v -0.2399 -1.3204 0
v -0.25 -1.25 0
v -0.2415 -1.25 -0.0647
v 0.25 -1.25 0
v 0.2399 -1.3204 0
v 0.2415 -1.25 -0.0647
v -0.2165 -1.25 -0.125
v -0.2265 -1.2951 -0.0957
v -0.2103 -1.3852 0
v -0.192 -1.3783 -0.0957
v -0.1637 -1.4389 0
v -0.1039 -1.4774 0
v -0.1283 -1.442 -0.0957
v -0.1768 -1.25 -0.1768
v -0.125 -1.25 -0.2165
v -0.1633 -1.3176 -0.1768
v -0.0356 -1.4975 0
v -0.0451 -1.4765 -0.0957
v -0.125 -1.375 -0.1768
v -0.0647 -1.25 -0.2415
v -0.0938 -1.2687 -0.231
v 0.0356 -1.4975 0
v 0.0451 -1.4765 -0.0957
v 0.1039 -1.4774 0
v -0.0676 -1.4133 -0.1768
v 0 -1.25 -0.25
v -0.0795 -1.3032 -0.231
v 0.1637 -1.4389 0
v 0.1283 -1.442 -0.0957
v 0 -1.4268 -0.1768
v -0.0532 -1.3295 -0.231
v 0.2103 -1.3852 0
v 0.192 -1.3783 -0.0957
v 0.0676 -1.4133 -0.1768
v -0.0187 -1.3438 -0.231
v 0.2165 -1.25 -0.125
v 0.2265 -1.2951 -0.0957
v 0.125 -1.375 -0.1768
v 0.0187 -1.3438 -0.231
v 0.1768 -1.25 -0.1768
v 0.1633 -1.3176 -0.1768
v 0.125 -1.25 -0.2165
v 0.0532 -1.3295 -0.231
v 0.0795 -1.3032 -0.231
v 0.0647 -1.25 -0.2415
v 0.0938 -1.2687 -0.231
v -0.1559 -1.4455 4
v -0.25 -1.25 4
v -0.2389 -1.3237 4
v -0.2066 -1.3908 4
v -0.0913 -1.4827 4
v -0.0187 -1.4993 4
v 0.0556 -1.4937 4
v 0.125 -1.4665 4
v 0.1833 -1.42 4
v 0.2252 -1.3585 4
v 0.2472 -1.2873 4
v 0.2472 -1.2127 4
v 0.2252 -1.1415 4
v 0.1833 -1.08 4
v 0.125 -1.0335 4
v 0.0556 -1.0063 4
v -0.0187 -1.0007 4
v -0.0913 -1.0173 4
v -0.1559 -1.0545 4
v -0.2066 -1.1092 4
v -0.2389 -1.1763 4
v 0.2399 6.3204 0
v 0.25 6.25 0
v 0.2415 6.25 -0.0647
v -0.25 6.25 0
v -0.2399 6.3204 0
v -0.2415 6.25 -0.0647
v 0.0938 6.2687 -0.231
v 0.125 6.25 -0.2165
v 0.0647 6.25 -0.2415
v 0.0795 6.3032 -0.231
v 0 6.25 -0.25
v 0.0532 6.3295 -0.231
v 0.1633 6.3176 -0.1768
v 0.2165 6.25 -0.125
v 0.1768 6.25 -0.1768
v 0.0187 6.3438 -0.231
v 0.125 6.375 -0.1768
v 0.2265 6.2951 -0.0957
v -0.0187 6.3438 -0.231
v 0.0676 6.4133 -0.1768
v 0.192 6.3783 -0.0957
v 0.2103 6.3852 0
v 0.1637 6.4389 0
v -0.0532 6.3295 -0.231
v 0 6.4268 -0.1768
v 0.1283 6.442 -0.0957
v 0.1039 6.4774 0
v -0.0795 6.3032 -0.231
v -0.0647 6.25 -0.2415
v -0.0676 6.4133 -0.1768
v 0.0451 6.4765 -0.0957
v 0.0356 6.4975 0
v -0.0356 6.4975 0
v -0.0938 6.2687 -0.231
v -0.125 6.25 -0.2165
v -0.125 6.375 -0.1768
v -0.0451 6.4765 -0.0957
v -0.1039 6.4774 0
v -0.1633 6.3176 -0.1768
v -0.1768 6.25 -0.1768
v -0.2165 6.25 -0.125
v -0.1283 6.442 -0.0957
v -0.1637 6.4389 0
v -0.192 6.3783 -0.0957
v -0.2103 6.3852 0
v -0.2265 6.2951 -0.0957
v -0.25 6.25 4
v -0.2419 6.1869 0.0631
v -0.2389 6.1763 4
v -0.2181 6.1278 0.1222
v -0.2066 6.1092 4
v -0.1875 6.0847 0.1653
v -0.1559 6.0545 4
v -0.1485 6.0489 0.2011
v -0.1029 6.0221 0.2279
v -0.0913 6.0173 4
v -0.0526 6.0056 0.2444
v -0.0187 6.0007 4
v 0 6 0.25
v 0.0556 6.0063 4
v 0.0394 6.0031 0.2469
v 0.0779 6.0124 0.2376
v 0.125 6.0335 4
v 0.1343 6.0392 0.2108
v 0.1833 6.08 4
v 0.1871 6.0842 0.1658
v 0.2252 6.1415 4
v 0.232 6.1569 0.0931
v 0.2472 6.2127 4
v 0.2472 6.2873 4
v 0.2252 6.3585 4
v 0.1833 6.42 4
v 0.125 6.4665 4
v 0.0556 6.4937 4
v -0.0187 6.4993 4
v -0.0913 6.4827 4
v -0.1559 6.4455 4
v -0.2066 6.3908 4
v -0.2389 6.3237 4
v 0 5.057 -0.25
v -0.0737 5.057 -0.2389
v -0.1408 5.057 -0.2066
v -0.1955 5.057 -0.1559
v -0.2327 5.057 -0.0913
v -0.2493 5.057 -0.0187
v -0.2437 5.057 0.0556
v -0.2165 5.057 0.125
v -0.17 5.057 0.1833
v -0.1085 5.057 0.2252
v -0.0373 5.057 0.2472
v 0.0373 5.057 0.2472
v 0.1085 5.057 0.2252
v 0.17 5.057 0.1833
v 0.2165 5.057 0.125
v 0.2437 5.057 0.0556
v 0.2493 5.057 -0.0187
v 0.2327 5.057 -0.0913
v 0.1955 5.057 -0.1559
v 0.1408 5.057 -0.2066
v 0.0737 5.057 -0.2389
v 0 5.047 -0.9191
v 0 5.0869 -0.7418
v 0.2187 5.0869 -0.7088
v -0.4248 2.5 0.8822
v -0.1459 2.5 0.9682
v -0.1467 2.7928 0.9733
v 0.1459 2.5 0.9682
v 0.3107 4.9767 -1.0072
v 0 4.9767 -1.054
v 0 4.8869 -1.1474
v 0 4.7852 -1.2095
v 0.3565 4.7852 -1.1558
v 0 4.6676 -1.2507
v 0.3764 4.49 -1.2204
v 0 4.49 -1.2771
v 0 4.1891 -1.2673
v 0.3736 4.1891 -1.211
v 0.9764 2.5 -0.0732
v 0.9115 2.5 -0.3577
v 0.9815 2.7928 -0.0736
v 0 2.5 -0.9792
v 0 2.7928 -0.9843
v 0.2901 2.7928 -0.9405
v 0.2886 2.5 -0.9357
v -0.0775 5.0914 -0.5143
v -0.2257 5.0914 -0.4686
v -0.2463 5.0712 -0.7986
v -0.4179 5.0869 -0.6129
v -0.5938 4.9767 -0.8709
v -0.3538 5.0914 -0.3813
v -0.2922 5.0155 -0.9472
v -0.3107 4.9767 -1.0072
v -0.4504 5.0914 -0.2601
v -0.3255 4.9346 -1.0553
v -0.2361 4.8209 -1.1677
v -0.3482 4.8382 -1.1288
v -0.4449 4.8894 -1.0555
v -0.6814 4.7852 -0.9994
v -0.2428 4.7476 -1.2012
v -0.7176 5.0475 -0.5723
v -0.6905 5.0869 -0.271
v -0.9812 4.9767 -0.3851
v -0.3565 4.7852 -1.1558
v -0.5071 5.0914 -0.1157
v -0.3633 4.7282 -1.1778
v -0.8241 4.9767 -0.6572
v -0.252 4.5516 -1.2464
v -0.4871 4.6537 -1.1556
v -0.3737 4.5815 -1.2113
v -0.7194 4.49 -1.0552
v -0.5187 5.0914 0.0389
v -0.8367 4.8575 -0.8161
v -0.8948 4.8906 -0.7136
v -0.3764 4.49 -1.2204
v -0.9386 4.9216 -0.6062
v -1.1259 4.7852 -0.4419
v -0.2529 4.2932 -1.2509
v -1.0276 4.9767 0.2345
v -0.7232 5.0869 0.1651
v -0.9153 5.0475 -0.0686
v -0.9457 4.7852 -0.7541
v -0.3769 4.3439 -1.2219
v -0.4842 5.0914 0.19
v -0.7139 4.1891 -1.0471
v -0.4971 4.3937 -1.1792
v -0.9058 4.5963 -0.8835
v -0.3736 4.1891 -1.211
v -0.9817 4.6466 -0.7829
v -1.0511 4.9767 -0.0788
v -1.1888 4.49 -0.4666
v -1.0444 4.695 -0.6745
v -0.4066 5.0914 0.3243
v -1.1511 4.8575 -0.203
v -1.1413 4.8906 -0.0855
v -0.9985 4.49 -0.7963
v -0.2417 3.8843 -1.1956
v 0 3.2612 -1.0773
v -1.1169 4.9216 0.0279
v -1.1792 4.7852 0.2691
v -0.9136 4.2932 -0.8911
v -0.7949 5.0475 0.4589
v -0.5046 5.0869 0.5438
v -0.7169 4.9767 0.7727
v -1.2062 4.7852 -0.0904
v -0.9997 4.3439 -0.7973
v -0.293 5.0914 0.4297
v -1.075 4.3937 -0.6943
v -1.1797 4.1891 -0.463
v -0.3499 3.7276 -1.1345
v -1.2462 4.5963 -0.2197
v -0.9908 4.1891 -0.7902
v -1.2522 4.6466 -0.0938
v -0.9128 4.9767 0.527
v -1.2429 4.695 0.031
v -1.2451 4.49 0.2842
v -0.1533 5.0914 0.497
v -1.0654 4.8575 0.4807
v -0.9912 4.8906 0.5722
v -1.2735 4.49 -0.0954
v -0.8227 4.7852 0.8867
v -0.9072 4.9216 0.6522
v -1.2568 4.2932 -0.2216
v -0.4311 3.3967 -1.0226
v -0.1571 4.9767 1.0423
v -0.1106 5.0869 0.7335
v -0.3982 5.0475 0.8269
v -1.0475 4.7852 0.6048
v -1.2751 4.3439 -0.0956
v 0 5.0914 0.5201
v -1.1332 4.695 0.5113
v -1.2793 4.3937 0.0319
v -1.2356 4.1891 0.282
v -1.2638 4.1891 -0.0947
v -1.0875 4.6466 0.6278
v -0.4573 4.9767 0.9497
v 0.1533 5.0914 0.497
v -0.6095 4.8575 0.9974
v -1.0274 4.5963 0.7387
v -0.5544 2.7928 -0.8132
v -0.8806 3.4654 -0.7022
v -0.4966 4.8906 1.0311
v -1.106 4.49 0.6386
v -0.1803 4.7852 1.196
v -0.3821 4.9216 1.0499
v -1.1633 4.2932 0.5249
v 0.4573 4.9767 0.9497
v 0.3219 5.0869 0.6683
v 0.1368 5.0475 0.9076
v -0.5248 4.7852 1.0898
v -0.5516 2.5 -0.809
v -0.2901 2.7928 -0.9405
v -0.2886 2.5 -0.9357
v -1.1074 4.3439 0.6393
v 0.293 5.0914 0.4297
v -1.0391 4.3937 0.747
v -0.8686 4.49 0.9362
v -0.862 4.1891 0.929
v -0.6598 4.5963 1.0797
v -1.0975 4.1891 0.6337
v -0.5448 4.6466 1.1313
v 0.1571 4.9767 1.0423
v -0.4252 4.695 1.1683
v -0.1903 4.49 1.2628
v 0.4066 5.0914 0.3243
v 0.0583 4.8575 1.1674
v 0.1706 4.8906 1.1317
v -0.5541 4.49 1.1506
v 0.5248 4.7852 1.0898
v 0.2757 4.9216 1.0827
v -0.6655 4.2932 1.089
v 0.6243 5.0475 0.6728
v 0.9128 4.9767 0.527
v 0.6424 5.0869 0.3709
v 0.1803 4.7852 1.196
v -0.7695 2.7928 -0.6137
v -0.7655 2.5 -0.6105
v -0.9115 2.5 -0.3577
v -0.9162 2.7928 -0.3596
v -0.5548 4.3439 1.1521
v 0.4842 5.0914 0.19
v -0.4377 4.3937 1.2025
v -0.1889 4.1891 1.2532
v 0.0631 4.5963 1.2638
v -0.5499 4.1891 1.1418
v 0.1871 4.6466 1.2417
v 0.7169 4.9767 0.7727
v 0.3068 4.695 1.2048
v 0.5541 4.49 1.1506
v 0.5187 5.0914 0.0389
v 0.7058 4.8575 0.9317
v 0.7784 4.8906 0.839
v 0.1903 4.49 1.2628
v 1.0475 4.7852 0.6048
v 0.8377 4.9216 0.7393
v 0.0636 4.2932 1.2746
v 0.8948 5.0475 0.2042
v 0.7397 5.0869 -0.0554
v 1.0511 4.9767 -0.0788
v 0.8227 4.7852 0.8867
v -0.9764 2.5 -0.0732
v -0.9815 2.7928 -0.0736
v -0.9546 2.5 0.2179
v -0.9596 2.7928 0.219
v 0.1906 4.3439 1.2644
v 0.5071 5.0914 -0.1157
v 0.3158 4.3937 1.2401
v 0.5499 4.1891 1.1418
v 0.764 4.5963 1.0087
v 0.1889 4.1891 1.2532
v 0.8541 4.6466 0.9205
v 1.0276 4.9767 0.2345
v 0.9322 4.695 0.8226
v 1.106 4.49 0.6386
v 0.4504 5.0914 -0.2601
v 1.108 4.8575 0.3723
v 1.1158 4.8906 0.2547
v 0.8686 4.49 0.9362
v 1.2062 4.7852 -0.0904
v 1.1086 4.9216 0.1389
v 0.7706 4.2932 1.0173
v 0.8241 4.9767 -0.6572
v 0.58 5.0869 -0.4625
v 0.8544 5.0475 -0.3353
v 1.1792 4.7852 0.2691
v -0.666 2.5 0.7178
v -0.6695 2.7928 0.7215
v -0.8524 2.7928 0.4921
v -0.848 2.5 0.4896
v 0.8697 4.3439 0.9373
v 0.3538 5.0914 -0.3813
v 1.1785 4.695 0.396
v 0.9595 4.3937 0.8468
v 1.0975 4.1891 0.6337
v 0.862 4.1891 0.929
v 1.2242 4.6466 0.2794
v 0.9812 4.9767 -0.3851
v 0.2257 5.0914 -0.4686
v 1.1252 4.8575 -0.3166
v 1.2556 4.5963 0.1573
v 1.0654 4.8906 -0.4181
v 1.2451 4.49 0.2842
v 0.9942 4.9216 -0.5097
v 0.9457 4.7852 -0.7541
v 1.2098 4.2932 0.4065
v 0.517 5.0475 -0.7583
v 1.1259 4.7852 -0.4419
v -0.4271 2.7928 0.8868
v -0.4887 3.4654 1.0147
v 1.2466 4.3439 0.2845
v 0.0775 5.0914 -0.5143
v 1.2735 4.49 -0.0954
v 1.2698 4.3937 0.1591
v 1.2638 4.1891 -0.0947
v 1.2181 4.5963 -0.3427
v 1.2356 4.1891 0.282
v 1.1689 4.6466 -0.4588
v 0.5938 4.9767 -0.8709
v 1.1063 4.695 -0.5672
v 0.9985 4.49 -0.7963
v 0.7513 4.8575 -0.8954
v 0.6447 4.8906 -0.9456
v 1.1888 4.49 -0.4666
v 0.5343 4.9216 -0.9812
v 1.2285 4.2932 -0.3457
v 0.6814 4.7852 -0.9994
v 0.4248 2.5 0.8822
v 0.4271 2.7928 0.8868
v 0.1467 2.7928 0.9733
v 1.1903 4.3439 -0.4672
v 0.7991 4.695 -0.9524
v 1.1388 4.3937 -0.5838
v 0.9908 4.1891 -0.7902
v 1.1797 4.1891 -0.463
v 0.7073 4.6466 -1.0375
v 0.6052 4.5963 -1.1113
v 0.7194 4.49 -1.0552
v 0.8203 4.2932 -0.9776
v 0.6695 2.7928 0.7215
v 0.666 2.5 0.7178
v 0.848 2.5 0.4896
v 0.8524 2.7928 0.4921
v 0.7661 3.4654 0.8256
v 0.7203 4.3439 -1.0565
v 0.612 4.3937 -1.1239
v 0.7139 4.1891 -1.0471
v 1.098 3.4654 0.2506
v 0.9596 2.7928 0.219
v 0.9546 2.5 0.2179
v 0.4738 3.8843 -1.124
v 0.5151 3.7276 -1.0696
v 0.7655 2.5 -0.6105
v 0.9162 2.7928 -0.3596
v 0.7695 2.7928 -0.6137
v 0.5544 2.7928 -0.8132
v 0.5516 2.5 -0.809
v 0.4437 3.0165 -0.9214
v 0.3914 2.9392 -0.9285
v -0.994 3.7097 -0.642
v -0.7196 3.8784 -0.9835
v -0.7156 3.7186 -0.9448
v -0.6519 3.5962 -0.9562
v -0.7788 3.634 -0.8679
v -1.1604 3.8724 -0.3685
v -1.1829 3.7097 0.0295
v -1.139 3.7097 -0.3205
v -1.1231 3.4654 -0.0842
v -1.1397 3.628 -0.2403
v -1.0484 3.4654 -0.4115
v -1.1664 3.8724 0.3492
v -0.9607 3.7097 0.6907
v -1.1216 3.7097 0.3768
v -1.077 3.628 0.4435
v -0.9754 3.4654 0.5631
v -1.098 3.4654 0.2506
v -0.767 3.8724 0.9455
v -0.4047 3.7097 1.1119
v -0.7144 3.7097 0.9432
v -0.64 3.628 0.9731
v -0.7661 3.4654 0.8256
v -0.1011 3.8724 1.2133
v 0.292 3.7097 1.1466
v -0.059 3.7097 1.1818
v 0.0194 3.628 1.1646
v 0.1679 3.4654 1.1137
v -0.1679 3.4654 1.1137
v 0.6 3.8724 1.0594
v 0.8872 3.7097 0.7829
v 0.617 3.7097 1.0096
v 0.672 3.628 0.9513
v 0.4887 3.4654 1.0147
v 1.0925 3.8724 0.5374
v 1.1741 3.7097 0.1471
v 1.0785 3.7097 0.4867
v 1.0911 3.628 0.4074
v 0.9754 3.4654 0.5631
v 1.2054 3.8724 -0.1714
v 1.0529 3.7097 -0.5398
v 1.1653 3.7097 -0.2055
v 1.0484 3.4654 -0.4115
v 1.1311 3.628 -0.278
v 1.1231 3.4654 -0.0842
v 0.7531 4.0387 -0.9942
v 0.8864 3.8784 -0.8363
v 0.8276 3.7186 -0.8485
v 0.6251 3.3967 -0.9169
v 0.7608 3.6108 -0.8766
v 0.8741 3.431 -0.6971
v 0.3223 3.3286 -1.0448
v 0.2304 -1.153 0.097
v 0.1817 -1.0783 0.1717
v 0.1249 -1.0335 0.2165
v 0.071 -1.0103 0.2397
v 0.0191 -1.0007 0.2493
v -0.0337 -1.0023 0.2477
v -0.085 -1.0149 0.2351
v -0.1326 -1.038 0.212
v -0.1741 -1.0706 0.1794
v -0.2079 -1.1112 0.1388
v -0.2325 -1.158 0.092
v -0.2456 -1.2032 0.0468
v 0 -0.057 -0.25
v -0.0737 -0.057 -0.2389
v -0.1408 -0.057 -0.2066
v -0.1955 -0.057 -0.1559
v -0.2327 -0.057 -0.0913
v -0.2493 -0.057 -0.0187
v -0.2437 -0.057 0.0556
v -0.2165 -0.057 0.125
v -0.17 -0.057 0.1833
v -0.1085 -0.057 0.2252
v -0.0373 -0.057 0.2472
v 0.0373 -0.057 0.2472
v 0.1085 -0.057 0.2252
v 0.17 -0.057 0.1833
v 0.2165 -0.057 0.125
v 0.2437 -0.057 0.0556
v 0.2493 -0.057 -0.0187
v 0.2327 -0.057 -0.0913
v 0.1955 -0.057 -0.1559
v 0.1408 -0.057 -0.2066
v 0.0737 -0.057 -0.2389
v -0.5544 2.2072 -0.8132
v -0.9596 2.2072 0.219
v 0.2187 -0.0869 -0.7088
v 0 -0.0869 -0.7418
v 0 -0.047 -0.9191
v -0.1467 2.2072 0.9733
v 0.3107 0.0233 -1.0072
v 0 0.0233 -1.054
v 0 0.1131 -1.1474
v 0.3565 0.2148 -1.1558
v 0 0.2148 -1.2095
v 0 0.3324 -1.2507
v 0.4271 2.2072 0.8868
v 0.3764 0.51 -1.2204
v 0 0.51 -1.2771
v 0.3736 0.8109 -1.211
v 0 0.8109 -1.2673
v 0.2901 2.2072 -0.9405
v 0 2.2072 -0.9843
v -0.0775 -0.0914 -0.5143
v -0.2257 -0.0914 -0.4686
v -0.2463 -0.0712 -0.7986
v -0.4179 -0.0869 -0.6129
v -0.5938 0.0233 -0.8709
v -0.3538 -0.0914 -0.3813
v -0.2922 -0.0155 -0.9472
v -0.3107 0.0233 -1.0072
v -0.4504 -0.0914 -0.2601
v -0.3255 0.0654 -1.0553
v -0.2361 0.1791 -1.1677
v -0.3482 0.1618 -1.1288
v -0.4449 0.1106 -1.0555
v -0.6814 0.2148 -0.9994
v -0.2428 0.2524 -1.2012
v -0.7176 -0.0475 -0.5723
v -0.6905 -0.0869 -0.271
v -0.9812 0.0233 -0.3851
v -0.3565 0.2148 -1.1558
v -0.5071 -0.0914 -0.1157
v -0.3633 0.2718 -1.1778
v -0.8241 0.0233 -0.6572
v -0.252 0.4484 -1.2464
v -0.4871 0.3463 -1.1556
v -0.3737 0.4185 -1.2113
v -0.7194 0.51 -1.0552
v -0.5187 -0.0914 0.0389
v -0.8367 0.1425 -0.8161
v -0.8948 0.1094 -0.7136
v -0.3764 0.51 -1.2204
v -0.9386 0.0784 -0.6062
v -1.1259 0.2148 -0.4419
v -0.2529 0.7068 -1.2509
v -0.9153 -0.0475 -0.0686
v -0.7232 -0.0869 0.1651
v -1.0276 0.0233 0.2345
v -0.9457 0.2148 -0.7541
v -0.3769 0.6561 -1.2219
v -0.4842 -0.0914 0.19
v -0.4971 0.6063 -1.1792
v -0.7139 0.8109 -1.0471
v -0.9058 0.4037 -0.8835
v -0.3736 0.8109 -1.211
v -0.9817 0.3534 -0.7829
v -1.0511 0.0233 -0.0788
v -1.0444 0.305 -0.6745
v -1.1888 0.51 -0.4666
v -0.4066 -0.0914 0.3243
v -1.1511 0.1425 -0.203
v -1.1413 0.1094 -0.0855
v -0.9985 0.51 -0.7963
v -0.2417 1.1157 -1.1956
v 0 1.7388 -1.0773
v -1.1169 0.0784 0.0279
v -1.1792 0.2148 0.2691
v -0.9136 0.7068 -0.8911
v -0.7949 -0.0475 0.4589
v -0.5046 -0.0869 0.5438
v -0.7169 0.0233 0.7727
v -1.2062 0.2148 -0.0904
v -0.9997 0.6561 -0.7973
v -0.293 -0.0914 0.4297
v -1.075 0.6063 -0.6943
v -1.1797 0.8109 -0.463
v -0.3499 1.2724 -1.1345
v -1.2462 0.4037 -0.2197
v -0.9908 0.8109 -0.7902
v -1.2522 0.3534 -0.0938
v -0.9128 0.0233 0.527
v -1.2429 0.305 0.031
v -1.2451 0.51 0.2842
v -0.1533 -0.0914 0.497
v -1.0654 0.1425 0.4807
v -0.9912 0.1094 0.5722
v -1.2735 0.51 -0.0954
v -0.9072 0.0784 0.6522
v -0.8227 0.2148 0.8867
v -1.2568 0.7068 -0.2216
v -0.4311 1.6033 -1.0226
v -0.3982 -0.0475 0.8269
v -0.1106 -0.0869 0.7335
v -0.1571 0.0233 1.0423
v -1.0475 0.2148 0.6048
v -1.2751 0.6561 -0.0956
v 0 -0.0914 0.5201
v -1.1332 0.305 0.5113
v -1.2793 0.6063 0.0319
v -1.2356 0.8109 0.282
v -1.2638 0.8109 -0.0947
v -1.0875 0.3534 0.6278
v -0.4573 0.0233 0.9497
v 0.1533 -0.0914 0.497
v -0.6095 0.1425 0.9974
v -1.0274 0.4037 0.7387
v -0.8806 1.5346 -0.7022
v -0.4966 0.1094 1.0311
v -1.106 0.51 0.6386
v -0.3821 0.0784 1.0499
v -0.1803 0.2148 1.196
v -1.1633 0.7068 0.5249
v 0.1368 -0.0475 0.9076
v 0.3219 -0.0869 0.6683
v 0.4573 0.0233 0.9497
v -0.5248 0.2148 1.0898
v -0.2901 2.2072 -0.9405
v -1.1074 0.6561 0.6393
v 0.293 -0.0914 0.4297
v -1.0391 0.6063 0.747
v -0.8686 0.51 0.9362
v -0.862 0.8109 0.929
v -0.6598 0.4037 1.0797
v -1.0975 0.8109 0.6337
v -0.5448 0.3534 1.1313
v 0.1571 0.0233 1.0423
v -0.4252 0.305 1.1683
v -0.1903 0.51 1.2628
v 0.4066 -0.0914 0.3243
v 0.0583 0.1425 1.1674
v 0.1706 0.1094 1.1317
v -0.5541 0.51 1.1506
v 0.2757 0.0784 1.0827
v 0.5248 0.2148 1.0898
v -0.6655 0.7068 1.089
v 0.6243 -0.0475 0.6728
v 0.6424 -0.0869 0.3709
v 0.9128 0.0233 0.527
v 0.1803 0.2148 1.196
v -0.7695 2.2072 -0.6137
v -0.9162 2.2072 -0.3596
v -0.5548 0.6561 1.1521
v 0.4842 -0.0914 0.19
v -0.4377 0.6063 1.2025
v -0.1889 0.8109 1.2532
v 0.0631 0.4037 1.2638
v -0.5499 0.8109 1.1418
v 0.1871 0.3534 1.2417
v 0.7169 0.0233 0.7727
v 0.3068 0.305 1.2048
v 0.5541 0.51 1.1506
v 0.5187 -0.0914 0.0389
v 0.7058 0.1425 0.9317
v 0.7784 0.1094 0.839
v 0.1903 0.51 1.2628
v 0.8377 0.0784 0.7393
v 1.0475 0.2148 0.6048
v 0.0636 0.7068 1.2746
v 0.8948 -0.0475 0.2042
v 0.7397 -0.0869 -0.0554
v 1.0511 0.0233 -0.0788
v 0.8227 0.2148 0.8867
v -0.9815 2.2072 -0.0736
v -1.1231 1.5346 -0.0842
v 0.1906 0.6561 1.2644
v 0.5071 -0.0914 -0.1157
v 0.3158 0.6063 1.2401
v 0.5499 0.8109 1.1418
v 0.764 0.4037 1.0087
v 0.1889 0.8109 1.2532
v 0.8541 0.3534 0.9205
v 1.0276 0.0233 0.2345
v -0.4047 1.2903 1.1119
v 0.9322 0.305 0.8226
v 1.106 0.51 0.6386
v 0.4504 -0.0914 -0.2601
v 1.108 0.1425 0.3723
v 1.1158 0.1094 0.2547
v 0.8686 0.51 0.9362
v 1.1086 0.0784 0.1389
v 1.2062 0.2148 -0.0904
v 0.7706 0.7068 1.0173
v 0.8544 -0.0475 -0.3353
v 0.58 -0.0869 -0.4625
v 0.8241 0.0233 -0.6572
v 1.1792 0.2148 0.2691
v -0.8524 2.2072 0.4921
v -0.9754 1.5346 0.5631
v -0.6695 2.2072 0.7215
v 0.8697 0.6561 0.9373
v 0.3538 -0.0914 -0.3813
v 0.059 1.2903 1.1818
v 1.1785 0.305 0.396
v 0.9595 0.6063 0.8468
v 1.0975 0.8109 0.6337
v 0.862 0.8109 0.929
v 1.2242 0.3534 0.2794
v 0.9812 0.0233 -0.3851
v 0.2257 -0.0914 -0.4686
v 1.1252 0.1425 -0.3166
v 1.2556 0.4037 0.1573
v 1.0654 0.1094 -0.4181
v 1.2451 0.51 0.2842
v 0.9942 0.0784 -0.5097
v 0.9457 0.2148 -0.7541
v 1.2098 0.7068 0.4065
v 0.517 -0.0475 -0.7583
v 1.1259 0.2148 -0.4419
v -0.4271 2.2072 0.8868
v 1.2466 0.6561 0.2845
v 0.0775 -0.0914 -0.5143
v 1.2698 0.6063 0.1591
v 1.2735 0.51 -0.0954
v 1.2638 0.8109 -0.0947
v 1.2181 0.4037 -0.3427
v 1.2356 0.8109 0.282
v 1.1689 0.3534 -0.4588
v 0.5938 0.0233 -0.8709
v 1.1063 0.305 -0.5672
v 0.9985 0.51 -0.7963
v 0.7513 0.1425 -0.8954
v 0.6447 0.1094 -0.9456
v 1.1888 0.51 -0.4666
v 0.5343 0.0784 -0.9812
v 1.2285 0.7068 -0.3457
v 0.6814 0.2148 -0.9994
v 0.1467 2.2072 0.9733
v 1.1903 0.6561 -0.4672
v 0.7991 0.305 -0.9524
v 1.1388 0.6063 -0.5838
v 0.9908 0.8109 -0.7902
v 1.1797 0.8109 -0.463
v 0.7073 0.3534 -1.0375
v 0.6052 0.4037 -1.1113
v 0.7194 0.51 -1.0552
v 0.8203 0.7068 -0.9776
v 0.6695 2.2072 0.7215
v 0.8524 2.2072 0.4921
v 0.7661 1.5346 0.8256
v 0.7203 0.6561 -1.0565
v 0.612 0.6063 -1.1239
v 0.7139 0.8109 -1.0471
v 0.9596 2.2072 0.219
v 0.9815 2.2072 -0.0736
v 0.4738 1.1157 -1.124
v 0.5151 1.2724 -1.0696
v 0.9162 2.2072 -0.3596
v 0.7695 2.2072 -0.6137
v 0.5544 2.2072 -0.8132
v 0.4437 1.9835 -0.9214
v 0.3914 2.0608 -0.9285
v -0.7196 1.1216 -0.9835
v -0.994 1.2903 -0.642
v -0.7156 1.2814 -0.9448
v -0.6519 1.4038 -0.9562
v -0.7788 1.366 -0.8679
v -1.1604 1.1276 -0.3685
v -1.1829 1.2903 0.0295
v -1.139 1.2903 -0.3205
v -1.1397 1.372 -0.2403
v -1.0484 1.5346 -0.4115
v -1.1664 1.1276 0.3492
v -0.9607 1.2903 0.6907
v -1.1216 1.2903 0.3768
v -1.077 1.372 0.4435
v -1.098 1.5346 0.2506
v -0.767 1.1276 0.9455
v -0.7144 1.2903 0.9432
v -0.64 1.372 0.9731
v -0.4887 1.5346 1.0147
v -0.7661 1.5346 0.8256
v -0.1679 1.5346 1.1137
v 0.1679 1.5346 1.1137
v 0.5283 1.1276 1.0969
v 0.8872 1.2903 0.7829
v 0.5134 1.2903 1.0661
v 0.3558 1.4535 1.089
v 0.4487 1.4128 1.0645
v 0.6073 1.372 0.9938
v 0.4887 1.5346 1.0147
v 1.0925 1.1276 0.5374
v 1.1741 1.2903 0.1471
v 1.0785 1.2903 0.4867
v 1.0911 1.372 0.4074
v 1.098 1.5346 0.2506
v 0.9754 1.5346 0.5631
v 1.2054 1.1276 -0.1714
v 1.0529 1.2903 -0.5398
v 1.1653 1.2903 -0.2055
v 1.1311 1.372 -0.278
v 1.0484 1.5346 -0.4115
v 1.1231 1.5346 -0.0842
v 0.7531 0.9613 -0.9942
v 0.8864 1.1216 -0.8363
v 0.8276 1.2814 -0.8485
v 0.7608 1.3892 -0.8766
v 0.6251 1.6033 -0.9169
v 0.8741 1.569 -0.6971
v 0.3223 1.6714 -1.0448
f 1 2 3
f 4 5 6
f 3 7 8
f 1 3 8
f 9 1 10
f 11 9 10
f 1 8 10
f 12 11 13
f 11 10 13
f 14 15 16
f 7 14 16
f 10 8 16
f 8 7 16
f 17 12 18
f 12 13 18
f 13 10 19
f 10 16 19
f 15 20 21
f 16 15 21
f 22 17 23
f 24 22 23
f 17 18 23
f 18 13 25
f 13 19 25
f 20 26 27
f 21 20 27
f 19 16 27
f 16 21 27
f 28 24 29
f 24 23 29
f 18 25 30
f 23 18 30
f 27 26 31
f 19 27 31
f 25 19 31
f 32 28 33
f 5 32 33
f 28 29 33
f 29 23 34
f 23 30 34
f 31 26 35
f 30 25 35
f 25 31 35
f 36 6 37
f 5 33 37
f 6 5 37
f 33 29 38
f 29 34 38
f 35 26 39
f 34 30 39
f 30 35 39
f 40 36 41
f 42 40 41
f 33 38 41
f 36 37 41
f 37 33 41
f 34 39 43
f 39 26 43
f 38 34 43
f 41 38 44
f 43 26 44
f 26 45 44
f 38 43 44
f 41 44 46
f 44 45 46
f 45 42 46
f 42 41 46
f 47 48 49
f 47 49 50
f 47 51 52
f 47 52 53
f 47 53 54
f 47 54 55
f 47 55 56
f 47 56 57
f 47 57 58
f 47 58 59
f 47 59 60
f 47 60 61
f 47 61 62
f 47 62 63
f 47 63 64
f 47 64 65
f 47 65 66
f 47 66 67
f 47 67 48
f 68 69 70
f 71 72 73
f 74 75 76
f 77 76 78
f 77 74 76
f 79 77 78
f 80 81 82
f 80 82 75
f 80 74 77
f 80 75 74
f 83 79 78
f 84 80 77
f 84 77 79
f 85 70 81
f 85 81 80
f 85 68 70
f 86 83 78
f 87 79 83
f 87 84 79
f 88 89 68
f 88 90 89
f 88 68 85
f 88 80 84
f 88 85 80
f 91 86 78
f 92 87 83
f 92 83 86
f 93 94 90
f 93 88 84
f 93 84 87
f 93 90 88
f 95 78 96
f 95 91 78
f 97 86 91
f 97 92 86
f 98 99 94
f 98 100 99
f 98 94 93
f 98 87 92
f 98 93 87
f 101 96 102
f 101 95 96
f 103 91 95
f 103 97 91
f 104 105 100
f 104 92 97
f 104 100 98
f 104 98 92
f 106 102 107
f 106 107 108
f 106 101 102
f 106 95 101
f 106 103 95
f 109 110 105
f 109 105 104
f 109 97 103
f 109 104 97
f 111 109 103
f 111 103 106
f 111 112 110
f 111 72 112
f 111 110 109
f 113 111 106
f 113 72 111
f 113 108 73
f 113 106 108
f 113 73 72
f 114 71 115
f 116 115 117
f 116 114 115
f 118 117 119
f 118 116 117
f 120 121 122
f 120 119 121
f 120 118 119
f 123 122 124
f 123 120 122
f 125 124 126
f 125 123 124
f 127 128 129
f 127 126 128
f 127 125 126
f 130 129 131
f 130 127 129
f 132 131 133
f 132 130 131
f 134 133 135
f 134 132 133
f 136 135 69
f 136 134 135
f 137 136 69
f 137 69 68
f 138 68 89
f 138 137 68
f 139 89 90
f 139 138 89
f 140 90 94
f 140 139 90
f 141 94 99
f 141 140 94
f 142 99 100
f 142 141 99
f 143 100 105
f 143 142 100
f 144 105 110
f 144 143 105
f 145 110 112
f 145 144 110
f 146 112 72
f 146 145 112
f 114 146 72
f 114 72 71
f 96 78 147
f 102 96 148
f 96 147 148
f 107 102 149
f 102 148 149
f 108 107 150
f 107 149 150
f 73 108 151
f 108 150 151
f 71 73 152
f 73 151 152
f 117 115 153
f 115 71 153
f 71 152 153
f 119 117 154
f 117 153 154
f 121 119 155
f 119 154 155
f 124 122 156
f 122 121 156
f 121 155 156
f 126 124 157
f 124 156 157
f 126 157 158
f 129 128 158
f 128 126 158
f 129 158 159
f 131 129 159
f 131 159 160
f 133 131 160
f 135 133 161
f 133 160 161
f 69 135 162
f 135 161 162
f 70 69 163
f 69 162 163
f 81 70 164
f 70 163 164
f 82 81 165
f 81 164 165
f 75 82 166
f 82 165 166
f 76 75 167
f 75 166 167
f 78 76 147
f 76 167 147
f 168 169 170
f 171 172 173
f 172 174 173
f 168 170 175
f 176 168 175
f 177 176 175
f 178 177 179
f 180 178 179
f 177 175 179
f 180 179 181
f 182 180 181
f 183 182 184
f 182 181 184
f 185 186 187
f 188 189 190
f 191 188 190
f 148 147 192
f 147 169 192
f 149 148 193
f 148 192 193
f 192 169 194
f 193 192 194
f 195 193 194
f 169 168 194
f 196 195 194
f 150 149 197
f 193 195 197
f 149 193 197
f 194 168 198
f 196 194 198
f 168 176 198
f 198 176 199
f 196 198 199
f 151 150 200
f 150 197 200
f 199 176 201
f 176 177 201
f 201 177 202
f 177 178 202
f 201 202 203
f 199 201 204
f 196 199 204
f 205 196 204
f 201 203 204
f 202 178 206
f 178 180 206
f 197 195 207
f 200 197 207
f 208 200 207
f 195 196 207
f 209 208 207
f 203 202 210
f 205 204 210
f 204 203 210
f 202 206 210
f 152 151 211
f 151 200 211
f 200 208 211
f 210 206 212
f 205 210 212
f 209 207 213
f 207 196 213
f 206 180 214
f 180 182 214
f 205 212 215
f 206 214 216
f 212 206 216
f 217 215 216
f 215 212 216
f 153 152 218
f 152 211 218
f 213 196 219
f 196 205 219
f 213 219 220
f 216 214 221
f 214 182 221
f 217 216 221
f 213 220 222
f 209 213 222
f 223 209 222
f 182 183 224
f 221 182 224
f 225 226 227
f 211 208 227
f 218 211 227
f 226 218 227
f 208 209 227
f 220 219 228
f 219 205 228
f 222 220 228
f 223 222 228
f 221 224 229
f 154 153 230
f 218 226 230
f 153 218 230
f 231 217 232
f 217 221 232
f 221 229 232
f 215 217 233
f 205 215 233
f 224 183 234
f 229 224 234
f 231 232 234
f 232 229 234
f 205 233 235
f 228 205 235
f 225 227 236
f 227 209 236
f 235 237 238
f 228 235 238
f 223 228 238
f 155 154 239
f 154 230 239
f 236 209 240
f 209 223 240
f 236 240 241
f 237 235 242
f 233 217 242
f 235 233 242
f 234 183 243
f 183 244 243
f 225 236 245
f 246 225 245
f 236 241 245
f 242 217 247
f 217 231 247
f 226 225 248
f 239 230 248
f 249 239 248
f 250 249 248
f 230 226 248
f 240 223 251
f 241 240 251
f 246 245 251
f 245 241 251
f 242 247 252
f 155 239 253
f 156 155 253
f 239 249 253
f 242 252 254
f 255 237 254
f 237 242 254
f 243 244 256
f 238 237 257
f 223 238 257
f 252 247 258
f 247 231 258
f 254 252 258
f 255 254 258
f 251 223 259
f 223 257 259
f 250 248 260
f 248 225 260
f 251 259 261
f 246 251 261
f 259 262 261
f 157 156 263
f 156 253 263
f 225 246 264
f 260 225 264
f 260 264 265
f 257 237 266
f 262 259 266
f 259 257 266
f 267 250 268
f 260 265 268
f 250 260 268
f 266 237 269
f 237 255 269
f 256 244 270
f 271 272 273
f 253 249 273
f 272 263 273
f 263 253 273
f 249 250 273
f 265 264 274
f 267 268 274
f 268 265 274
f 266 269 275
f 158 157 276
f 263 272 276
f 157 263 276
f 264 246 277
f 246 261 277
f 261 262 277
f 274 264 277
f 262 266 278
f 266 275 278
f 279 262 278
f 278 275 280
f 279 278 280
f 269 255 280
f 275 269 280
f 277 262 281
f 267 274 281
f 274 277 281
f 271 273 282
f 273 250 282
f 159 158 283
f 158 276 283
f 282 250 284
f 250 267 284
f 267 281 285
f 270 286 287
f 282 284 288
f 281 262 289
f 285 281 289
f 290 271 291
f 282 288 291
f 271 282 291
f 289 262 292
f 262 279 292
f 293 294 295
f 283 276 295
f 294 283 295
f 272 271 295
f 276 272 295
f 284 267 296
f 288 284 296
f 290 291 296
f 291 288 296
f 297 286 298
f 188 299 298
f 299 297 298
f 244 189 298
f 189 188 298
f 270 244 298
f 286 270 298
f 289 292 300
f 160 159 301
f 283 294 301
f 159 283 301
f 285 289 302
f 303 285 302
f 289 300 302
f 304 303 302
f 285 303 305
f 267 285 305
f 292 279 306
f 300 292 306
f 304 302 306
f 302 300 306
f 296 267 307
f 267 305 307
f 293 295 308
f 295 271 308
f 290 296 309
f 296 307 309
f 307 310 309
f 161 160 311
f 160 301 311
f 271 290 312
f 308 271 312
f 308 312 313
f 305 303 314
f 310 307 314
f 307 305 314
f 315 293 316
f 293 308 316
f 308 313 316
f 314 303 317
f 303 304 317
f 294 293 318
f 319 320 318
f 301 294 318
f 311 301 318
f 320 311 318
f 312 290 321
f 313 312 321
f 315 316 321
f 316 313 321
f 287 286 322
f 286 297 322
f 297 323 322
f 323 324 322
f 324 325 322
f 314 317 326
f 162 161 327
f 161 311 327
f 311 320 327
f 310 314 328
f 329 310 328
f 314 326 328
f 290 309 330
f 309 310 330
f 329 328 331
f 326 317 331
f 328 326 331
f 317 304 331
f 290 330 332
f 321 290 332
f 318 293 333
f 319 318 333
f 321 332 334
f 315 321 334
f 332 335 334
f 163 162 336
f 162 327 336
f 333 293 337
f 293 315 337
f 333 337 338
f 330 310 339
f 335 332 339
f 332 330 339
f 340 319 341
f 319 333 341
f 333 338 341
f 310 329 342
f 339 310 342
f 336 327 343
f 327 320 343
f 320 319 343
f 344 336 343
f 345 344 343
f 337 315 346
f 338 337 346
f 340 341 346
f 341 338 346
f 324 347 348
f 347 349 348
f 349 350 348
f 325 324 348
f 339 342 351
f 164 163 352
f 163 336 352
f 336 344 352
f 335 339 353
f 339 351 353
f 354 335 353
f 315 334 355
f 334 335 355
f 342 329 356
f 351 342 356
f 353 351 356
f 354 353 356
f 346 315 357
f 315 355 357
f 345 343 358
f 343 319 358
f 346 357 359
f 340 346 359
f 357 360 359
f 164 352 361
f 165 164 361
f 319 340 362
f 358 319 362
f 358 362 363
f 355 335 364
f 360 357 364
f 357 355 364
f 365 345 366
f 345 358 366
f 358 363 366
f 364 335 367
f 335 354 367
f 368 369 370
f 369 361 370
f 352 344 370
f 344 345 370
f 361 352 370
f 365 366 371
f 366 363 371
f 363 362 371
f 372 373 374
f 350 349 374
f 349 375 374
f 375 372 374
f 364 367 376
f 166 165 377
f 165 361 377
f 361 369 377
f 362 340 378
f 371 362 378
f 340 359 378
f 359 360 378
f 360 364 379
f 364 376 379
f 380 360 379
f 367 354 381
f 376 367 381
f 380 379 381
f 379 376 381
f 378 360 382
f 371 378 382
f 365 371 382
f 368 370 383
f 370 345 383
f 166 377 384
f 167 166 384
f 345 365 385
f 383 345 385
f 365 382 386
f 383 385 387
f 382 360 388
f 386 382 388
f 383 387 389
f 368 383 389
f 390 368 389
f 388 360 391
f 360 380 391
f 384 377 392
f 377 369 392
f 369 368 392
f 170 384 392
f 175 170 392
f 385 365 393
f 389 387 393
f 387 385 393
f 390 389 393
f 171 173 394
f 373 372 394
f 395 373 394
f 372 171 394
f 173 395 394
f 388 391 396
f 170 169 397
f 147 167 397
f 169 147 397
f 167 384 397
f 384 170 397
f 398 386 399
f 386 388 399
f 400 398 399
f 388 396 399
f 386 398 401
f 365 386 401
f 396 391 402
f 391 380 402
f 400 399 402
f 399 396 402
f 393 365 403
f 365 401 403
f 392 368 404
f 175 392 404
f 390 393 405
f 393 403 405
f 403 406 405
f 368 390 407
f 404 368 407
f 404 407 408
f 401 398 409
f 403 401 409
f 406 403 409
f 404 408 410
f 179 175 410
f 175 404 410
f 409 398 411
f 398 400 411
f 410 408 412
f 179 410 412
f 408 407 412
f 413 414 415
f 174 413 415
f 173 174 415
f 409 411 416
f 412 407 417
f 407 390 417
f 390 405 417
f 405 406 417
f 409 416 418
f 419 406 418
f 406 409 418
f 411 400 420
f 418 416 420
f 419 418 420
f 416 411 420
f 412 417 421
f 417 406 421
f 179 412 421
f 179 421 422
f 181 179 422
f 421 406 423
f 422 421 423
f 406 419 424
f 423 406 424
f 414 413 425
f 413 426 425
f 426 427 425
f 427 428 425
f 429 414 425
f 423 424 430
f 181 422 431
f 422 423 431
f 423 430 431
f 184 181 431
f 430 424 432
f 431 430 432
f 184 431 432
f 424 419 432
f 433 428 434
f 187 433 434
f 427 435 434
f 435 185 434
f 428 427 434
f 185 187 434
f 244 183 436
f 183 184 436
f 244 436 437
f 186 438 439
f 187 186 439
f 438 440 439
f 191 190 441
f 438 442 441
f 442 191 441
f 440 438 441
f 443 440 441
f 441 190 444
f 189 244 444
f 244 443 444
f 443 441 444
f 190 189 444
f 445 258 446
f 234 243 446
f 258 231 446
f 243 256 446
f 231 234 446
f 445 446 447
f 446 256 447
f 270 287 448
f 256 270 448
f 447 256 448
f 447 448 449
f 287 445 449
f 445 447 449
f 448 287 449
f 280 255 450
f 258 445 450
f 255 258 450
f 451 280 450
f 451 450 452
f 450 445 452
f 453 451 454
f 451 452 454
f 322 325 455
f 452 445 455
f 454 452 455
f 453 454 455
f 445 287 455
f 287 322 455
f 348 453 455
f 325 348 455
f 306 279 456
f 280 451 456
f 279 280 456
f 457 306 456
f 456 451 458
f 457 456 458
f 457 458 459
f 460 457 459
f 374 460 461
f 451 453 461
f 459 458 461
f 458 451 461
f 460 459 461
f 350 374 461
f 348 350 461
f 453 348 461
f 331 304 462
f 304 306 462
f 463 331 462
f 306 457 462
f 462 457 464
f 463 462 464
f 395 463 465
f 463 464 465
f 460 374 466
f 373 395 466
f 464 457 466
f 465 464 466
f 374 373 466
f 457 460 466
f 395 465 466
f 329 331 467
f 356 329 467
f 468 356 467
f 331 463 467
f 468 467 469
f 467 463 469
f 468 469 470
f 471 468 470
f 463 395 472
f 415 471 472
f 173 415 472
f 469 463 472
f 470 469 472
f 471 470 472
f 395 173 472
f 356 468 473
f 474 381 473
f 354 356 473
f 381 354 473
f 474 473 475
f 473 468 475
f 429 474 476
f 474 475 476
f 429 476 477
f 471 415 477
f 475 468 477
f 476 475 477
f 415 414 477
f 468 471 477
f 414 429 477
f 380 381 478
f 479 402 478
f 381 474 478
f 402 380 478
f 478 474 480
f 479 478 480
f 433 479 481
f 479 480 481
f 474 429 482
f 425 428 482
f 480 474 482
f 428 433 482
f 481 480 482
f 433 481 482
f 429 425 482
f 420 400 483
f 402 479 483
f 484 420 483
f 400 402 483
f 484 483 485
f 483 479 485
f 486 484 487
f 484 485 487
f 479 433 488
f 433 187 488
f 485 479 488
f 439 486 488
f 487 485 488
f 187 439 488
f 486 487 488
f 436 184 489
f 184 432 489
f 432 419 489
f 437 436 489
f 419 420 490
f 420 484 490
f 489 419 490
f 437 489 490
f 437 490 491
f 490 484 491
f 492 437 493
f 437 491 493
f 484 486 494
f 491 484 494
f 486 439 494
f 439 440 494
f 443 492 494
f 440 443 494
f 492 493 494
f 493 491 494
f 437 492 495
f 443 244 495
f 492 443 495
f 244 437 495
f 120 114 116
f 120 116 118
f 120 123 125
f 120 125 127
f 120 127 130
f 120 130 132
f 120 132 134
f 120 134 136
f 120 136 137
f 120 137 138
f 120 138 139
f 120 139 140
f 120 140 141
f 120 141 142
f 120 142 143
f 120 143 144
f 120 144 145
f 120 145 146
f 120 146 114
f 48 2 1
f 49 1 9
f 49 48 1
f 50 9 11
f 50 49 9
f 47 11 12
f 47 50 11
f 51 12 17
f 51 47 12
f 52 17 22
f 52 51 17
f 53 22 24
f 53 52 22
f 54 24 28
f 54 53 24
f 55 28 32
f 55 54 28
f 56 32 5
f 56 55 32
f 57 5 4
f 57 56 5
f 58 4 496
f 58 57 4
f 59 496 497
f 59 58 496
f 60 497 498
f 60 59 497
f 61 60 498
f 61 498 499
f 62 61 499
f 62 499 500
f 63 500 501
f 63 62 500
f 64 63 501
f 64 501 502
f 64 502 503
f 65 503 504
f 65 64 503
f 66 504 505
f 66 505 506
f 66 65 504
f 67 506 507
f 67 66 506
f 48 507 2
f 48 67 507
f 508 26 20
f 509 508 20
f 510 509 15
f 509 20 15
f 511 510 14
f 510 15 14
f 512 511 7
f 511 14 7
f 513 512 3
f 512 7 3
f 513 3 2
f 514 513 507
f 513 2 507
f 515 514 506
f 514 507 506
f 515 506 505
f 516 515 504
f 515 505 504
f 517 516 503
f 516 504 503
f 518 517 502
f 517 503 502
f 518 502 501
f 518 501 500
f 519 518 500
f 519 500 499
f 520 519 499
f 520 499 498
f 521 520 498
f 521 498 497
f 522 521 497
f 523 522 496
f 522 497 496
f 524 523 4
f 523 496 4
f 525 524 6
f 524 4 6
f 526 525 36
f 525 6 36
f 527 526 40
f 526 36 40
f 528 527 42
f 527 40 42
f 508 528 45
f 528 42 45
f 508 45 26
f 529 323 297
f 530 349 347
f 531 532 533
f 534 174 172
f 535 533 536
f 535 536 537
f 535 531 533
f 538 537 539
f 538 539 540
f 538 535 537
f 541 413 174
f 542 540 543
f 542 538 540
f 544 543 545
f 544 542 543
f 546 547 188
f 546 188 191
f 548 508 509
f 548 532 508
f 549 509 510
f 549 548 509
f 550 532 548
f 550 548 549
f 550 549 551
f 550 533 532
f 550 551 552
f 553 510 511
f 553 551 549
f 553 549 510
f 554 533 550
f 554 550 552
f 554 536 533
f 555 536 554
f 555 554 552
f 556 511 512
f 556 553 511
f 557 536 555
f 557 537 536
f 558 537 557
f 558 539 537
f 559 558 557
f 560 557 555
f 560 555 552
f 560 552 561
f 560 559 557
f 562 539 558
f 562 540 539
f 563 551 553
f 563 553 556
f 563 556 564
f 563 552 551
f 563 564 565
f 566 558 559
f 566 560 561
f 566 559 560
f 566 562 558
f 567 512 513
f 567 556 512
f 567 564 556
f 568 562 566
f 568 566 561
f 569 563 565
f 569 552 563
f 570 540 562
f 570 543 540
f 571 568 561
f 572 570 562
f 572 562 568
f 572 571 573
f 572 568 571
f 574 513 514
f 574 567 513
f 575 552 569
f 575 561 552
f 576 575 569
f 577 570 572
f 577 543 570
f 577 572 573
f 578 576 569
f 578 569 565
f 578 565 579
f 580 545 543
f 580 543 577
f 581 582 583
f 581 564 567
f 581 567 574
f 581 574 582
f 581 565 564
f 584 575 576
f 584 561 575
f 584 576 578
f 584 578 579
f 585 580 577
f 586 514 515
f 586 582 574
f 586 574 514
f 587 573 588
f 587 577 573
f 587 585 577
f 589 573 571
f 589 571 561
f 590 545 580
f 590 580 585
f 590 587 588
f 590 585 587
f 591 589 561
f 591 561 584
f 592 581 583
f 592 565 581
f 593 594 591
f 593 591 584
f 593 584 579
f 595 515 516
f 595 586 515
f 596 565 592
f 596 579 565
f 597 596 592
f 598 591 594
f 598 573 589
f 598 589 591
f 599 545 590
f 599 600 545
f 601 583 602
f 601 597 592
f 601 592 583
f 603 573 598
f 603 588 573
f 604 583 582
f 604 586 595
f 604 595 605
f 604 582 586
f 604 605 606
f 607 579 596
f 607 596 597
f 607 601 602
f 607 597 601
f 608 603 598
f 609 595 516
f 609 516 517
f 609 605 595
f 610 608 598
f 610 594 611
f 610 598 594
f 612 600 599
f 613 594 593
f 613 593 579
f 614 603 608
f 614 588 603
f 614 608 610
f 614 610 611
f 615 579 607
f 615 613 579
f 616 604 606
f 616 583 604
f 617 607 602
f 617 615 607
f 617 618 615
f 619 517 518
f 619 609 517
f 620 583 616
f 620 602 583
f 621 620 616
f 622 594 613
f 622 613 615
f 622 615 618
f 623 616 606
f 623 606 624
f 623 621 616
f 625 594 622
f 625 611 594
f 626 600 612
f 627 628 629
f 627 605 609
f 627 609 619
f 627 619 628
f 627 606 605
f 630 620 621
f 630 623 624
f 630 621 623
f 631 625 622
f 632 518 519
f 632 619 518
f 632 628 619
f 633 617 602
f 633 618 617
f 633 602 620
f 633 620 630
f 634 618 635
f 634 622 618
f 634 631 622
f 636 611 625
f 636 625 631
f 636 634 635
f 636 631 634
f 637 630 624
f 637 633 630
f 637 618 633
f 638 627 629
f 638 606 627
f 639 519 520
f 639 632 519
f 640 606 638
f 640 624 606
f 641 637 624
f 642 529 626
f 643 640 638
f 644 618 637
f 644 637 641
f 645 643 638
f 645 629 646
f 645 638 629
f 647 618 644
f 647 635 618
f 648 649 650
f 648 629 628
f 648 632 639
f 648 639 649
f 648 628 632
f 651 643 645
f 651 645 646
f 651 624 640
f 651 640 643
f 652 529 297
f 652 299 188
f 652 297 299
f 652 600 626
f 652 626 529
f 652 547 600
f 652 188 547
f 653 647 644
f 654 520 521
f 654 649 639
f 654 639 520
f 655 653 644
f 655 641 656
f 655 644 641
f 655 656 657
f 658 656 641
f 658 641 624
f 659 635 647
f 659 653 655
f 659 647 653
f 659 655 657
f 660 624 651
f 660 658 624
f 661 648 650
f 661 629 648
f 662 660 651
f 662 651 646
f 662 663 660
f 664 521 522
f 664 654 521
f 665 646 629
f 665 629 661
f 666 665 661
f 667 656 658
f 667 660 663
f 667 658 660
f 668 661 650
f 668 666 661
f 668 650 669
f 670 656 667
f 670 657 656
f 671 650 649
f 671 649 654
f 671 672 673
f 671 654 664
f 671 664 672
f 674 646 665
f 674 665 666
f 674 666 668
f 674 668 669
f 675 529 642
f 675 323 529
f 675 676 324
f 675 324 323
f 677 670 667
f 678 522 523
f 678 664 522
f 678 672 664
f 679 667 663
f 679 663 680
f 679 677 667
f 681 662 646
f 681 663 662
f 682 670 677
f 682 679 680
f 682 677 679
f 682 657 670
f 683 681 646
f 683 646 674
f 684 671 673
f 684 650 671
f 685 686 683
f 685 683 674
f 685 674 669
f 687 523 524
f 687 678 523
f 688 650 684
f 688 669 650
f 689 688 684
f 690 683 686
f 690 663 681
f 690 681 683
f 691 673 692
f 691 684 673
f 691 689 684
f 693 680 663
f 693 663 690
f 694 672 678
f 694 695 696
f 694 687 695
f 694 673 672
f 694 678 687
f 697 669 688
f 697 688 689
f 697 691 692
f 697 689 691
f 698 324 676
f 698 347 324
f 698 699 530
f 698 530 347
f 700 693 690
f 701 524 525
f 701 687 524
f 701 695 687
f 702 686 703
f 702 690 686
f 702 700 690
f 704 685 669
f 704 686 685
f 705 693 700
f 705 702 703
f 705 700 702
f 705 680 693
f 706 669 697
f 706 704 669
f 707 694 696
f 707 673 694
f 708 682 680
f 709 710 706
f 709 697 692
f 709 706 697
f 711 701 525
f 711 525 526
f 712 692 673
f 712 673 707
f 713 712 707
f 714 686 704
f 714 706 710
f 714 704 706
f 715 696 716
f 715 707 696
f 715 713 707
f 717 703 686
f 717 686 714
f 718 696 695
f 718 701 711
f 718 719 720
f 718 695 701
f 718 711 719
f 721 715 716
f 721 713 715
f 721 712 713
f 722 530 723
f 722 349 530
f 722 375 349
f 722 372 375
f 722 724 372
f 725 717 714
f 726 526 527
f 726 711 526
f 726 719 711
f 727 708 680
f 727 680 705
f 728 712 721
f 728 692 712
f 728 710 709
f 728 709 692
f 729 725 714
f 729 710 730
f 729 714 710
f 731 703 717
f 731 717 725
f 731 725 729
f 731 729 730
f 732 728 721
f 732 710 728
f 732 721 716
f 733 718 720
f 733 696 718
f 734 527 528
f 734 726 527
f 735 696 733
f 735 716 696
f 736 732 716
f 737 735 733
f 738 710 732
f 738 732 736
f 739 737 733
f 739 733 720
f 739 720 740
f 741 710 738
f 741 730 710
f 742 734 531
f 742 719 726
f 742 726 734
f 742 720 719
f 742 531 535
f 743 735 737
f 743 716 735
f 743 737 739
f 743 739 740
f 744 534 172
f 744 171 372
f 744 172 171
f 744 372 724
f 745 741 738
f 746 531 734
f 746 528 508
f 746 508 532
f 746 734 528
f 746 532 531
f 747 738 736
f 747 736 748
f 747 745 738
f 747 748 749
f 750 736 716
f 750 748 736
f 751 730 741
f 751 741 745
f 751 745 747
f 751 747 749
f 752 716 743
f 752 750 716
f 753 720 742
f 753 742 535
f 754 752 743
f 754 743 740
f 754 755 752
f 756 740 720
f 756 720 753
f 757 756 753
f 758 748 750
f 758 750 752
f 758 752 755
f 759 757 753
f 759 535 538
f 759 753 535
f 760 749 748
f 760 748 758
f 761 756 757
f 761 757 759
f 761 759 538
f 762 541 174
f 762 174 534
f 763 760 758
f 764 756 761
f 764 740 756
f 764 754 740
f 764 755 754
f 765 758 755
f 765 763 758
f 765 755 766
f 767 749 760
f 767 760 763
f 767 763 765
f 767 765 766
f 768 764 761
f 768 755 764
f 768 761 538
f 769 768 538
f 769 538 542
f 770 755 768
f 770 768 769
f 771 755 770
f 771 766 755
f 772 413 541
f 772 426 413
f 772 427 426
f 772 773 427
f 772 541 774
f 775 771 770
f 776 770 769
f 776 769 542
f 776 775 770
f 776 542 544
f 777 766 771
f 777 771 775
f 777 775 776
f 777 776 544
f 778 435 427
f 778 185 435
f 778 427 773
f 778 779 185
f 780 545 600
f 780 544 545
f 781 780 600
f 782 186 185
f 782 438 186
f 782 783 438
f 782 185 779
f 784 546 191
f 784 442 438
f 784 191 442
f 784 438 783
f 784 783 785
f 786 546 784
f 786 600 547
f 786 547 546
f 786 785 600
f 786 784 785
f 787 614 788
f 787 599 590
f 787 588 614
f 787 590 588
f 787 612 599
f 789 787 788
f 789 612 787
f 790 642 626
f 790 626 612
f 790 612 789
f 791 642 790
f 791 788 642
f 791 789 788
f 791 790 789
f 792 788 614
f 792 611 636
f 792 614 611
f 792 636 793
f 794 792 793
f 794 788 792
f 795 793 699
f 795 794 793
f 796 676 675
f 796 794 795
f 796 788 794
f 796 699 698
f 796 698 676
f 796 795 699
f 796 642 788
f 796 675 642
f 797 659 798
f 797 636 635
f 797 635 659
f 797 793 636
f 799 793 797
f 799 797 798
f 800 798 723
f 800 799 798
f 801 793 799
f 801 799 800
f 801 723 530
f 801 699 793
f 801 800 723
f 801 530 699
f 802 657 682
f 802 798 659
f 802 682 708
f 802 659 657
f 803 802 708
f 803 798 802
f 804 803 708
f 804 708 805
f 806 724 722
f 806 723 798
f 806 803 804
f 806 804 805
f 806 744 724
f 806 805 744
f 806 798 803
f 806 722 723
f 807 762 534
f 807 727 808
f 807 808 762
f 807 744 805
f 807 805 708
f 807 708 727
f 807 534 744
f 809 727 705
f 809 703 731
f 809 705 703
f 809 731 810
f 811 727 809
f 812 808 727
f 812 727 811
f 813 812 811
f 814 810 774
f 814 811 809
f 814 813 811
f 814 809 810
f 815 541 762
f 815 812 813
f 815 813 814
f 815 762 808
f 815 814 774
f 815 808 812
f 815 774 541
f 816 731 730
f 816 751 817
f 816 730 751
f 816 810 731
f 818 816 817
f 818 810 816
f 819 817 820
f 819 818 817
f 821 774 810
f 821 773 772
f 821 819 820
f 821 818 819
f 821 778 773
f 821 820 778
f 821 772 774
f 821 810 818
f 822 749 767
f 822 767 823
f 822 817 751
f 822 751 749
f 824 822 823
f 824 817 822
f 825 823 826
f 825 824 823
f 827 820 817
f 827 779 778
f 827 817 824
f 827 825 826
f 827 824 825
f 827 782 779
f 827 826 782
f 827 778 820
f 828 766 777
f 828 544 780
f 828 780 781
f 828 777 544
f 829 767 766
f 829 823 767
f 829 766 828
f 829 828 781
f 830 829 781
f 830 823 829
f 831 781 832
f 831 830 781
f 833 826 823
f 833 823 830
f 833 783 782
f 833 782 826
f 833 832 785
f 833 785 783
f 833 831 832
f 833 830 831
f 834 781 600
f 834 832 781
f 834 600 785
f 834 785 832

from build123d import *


with BuildPart() as part:
    # Esquisse2 → Révolution1 (revolve)
    with BuildSketch(Plane.XY):
        with BuildLine():
            add(Edge.make_bspline(
                [(-0.25, 5.05698061), (-2.107045179, 5.402904177), (-0.86139121, 3.236013516), (-0.979154643, 2.5)],
                knots=[0.040200469, 0.040200469, 0.040200469, 0.040200469, 1, 1, 1, 1], degree=3))
            add(Edge.make_bspline(
                [(-0.25, -0.05698061), (-2.107045179, -0.402904177), (-0.86139121, 1.763986484), (-0.979154643, 2.5)],
                knots=[0.040200469, 0.040200469, 0.040200469, 0.040200469, 1, 1, 1, 1], degree=3))
            Line((-0.25, -0.05698061), (-0.25, -1.25))
            Line((-0.25, -1.25), (0, -1.25))
            Line((0, -1.25), (0, 6.25))
            Line((0, 6.25), (-0.25, 6.25))
            Line((-0.25, 6.25), (-0.25, 5.05698061))
        make_face()
    revolve(axis=Axis((0, 0, 0), (0, 1, 0)))

    # Esquisse4 → Révolution2 (revolve)
    with BuildSketch(Plane(origin=(0, -1.25, 0), x_dir=(-1, 0, 0), z_dir=(0, -1, 0))):
        with BuildLine():
            ThreePointArc((0, 0.25), (-0.176776695, 0.176776695), (-0.25, 0))
            Line((-0.25, 0), (-0.25, -4))
            Line((-0.25, -4), (0, -4))
            Line((0, -4), (0, 0.25))
        make_face()
    revolve(axis=Axis((0, -1.25, 0), (0, 0, 1)))

    # Esquisse5 → Révolution3 (revolve)
    with BuildSketch(Plane(origin=(0, 6.25, 0), x_dir=(1, 0, 0), z_dir=(0, 1, 0))):
        with BuildLine():
            ThreePointArc((0, 0.25), (-0.176776695, 0.176776695), (-0.25, 0))
            Line((-0.25, 0), (-0.25, -4))
            Line((-0.25, -4), (0, -4))
            Line((0, -4), (0, 0.25))
        make_face()
    revolve(axis=Axis((0, 6.25, 0), (0, 0, 1)))


solid = part.part
